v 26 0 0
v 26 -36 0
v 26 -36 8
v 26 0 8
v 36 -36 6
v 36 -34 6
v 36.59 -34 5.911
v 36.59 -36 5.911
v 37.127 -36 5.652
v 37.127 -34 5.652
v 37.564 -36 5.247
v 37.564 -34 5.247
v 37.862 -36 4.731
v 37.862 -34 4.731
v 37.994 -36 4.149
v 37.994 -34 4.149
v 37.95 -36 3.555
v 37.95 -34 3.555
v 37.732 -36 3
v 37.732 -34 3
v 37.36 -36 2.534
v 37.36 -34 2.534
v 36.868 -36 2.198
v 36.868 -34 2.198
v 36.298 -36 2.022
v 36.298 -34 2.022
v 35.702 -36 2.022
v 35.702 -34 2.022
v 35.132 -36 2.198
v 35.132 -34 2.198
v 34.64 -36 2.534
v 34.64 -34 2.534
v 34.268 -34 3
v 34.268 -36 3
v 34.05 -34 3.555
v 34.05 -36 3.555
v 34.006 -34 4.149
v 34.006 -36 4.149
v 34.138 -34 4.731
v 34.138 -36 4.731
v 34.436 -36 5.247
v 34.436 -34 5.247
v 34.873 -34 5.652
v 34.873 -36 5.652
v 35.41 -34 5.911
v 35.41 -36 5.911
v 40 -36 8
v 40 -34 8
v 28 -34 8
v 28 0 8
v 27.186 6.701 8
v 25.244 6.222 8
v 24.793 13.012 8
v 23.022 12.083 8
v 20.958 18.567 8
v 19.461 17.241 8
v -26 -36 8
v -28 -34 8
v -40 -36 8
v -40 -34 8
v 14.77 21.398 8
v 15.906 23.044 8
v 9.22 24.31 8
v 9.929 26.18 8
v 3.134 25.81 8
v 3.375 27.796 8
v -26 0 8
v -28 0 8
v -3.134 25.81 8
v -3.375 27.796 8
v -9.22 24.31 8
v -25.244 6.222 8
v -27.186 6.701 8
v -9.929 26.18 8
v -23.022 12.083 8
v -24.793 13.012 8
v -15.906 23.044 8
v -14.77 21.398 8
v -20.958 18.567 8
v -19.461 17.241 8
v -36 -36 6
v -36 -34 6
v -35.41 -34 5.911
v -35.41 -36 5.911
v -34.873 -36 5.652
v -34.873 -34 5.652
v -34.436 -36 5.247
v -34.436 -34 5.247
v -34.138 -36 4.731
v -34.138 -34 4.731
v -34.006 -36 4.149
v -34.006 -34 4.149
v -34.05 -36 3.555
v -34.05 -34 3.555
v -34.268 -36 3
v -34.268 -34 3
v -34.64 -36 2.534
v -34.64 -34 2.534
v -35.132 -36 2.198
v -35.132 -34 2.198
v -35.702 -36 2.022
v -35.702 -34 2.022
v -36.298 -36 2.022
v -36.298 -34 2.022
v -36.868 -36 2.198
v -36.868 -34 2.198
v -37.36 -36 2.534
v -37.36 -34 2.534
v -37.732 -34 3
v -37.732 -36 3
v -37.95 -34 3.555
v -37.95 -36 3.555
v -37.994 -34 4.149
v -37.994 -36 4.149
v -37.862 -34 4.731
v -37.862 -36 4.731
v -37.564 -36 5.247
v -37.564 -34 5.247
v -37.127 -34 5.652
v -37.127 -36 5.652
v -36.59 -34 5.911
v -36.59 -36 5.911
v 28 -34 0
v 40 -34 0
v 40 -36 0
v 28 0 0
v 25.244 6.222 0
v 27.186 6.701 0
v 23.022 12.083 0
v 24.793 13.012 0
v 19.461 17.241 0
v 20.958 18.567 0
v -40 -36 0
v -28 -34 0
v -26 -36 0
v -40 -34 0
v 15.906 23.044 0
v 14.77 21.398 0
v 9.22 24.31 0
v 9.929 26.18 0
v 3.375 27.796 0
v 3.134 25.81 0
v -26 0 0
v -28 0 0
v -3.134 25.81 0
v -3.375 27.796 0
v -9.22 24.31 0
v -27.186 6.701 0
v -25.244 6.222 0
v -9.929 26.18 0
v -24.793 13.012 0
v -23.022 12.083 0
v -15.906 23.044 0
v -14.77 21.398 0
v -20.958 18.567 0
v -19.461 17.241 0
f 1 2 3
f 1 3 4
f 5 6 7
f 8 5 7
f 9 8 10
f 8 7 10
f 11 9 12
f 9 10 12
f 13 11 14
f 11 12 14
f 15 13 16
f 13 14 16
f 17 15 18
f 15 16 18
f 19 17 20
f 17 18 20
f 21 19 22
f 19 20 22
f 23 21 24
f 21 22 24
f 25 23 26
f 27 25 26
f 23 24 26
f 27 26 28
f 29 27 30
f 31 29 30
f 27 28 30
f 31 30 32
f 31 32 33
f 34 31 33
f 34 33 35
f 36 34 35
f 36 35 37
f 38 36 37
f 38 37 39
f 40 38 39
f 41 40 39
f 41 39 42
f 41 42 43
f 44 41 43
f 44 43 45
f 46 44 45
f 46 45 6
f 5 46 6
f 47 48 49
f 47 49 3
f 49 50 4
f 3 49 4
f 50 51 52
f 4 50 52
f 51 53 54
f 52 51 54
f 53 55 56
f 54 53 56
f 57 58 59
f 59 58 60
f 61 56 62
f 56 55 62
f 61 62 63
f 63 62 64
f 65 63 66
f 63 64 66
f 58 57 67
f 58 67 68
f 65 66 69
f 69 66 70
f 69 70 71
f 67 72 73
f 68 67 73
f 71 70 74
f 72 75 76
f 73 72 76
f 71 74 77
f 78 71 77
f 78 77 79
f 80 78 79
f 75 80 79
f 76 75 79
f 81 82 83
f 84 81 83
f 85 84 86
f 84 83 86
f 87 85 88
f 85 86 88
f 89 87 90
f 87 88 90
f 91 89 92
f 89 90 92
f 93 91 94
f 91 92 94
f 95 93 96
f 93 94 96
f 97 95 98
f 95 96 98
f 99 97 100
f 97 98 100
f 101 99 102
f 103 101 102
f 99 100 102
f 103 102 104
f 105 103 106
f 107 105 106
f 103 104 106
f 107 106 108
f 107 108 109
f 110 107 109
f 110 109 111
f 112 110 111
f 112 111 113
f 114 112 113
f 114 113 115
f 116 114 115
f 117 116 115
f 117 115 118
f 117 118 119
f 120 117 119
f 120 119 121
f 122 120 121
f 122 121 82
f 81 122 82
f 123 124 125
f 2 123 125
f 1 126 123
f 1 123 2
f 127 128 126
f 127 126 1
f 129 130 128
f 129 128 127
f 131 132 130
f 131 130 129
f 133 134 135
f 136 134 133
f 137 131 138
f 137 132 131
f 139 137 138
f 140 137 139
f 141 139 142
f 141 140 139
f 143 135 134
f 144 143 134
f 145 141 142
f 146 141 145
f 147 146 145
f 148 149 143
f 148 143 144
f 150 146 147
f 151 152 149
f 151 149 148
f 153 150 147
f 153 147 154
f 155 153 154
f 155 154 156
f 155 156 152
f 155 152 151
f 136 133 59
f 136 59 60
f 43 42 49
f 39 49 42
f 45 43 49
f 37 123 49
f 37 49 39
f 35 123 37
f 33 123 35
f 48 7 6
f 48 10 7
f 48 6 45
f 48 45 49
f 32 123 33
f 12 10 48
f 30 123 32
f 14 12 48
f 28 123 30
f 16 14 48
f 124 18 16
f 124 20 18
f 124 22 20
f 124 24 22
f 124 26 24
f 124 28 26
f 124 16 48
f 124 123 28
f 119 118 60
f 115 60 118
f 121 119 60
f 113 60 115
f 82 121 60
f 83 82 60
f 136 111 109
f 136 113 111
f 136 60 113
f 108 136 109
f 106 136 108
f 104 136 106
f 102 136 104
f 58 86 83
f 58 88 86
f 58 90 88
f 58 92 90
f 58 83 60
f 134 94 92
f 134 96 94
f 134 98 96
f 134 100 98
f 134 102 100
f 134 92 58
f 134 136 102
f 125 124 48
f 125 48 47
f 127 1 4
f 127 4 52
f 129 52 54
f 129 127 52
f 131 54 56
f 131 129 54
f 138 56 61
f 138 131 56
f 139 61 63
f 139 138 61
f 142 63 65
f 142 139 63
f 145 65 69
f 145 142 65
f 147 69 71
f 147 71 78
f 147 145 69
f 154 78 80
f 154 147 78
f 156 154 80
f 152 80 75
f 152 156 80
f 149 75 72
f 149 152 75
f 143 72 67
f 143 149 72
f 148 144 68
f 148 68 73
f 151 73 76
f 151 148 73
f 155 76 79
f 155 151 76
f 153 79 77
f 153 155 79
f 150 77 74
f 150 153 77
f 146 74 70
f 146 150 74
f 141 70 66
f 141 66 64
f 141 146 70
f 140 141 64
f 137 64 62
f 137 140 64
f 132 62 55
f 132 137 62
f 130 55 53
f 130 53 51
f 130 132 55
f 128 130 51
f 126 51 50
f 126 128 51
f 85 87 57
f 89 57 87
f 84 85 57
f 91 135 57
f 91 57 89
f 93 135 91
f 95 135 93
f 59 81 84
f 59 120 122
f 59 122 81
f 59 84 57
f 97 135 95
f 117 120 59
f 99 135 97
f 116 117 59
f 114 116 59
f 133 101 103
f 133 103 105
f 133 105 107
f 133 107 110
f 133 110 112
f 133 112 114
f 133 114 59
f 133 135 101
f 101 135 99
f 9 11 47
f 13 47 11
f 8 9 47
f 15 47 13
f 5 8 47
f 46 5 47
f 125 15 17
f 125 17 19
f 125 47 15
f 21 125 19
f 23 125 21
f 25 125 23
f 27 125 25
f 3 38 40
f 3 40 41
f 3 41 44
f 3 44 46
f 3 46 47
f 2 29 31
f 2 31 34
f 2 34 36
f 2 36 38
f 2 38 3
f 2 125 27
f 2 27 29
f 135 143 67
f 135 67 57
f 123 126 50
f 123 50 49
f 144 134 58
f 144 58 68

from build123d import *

# Parameters (mm, degrees)
BOSS_EXTRUDE1_DEPTH         = 8
TAP_DRILL_FOR_M4X0_7_TAP1_D = 3.3
SKETCH4_R                   = 2
CUT_EXTRUDE1_DEPTH          = 75.215901261


with BuildPart() as part:
    # Sketch3 → Boss-Extrude1 (new body)
    with BuildSketch(Plane.XY):
        with BuildLine():
            Line((28, 0), (28, -34))
            Line((28, -34), (40, -34))
            Line((40, -34), (40, -36))
            Line((40, -36), (26, -36))
            Line((26, -36), (26, 0))
            ThreePointArc((26, 0), (0, 26), (-26, 0))
            Line((-26, 0), (-26, -36))
            Line((-26, -36), (-40, -36))
            Line((-40, -36), (-40, -34))
            Line((-40, -34), (-28, -34))
            Line((-28, -34), (-28, 0))
            ThreePointArc((-28, 0), (0, 28), (28, 0))
        make_face()
    extrude(amount=BOSS_EXTRUDE1_DEPTH)

    # Tap Drill for M4x0.7 Tap1 (through all)
    with Locations(Plane(origin=(0, -34, 0), x_dir=(1, 0, 0), z_dir=(0, 1, 0))):
        with Locations((-36, -4), (36, -4)):
            Hole(TAP_DRILL_FOR_M4X0_7_TAP1_D / 2)

    # Sketch4 → Cut-Extrude1 (cut, through all)
    with BuildSketch(Plane(origin=(0, -34, 0), x_dir=(1, 0, 0), z_dir=(0, 1, 0))):
        with Locations(Location((-36, -4, 0), (0, 0, 270))):
            Circle(SKETCH4_R)
        with Locations(Location((36, -4, 0), (0, 0, 270))):
            Circle(SKETCH4_R)
    extrude(amount=-CUT_EXTRUDE1_DEPTH, mode=Mode.SUBTRACT)


solid = part.part
